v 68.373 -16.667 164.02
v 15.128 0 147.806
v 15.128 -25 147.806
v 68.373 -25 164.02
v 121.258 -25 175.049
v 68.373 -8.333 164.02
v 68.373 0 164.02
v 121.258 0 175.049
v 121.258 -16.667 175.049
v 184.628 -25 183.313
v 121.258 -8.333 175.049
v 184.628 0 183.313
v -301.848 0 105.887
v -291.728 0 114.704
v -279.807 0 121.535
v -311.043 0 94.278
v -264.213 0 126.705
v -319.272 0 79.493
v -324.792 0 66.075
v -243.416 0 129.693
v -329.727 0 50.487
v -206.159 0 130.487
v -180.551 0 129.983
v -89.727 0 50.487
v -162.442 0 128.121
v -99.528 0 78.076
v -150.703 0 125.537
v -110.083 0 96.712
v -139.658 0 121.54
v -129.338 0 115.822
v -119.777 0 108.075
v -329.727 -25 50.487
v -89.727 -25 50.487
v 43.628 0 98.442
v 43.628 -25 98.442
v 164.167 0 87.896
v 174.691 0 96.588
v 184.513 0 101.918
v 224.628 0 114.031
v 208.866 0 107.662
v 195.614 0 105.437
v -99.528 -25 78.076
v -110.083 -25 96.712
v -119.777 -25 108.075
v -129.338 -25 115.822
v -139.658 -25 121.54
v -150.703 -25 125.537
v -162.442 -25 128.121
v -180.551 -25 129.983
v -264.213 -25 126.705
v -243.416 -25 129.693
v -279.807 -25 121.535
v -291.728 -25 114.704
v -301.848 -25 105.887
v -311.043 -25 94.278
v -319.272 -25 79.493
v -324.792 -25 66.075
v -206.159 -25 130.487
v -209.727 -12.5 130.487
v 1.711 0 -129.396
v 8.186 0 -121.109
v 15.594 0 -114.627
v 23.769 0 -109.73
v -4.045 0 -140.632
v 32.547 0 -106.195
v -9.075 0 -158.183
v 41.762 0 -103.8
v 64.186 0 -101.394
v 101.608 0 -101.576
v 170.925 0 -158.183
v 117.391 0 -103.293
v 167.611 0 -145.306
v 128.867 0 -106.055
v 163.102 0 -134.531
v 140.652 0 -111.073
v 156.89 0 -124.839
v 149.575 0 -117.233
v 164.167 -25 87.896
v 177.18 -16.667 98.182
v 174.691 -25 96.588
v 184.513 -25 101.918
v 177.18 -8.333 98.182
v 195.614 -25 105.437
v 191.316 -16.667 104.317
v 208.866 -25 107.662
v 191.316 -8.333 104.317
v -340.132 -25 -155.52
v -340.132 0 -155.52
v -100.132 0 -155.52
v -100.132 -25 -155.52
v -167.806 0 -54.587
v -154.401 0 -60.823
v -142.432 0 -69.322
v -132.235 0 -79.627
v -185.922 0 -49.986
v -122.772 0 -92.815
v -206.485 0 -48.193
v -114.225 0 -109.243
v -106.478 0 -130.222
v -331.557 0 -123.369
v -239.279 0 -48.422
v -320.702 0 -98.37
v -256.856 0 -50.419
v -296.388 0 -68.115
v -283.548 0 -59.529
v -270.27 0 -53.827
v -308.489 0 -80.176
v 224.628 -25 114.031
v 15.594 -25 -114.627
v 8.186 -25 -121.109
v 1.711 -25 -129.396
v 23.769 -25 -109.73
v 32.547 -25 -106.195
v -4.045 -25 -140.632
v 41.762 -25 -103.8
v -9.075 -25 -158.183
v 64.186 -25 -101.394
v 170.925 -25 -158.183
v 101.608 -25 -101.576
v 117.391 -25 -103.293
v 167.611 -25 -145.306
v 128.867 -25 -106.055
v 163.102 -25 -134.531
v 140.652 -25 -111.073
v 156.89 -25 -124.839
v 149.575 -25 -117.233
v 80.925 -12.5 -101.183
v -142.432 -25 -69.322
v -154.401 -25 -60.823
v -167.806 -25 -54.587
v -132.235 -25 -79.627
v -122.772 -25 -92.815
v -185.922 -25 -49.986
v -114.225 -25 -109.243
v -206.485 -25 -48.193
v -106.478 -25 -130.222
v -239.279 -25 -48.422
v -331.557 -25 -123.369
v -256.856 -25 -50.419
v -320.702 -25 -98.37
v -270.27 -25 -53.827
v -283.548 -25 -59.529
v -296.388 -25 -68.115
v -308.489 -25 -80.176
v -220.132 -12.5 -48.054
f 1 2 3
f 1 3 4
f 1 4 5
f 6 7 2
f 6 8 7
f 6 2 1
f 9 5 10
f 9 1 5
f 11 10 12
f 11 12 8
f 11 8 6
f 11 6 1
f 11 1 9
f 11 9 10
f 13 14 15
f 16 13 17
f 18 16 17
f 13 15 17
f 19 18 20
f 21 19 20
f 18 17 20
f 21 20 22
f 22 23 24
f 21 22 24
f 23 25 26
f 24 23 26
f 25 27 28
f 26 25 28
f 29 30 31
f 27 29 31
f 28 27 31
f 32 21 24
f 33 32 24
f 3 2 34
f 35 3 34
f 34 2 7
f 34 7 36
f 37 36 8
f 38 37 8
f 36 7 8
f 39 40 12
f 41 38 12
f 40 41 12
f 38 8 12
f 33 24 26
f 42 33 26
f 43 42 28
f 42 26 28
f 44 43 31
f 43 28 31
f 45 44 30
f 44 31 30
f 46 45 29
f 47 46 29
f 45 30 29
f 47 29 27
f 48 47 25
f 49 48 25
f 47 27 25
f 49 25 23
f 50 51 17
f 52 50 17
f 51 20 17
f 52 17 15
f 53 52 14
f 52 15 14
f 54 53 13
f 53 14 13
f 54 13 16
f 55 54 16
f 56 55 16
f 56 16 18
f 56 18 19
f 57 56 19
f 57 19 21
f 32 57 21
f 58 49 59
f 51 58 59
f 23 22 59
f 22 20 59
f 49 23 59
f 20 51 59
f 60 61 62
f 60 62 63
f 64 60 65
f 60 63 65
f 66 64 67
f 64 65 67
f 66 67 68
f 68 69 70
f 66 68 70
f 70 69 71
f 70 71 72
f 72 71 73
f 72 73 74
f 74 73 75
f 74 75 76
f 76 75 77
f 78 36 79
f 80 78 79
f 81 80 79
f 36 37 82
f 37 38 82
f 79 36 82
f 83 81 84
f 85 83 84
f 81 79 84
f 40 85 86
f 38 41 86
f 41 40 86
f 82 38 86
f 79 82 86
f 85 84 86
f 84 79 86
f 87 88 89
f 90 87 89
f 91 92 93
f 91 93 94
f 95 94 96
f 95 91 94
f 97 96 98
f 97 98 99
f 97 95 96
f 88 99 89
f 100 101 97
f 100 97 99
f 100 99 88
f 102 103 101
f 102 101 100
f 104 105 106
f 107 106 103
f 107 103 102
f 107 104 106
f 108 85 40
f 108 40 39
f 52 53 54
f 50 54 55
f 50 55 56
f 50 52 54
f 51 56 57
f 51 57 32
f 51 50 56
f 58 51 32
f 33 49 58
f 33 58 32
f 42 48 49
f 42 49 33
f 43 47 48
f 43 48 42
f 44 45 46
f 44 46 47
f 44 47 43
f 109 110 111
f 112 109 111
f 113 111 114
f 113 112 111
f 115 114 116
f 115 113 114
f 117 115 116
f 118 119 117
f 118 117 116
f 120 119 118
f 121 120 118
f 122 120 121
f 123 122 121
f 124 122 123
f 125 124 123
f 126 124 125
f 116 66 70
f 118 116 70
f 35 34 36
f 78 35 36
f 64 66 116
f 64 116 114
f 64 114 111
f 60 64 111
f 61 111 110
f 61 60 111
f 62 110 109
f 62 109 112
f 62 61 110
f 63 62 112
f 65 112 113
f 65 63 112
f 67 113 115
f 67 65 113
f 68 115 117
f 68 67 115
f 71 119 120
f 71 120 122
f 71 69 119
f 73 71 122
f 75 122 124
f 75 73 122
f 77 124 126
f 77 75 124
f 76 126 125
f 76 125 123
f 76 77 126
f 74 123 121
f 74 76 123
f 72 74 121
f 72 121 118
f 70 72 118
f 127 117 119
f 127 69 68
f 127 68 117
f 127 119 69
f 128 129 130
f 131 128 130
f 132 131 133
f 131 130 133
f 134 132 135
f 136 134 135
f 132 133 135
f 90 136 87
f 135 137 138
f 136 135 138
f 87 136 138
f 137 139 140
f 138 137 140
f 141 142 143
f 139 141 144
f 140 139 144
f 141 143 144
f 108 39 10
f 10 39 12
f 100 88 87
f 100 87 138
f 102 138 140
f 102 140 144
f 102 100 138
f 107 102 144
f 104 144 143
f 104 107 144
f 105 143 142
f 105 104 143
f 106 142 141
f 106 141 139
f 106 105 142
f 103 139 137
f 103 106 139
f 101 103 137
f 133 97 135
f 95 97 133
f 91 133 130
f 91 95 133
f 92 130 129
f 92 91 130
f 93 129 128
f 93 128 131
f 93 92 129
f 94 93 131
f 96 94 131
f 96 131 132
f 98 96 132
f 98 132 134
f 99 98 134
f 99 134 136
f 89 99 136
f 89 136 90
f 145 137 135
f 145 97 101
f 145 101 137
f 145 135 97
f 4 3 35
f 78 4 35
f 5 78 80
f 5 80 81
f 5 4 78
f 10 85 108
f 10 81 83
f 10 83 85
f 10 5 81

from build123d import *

# Parameters (mm, degrees)
F1_DEPTH = 25


with BuildPart() as f1:
    # F0 (on Front) → F1 (new body)
    with BuildSketch(Plane.XZ):
        with BuildLine():
            add(Edge.make_bspline(
                [(-209.727108, 130.487437), (-264.727108, 130.487437), (-307.545149, 130.487437), (-329.727108, 50.487437)],
                knots=[0, 0, 0, 0, 144.222051, 144.222051, 144.222051, 144.222051], degree=3))
            Line((-329.727108, 50.487437), (-89.727108, 50.487437))
            add(Edge.make_bspline(
                [(-209.727108, 130.487437), (-154.727108, 130.487437), (-111.909068, 130.487437), (-89.727108, 50.487437)],
                knots=[0, 0, 0, 0, 144.222051, 144.222051, 144.222051, 144.222051], degree=3))
        make_face()
        with BuildLine():
            add(Edge.make_bspline(
                [(-340.13229, -155.519664), (-318.40942, -48.05428), (-260.13229, -48.05428), (-220.13229, -48.05428)],
                knots=[0, 0, 0, 0, 161.08634, 161.08634, 161.08634, 161.08634], degree=3))
            Line((-340.13229, -155.519664), (-100.13229, -155.519664))
            add(Edge.make_bspline(
                [(-220.13229, -48.05428), (-180.13229, -48.05428), (-121.855161, -48.05428), (-100.13229, -155.519664)],
                knots=[0, 0, 0, 0, 161.08634, 161.08634, 161.08634, 161.08634], degree=3))
        make_face()
        with BuildLine():
            Line((-9.075422, -158.183262), (170.924578, -158.183262))
            add(Edge.make_bspline(
                [(80.924578, -101.183262), (115.924578, -101.183262), (160.050973, -101.183262), (170.924578, -158.183262)],
                knots=[0, 0, 0, 0, 106.531685, 106.531685, 106.531685, 106.531685], degree=3))
            add(Edge.make_bspline(
                [(-9.075422, -158.183262), (1.798183, -101.183262), (45.924578, -101.183262), (80.924578, -101.183262)],
                knots=[0, 0, 0, 0, 106.531685, 106.531685, 106.531685, 106.531685], degree=3))
        make_face()
        with BuildLine():
            Line((208.865712, 107.662402), (224.627837, 114.030714))
            Line((224.627837, 114.030714), (184.627837, 183.312746))
            add(Edge.make_bspline(
                [(15.127837, 147.805705), (72.169736, 167.419079), (112.398855, 175.624958), (184.627837, 183.312746)],
                knots=[0, 0, 0, 0, 173.179098, 173.179098, 173.179098, 173.179098], degree=3))
            Line((15.127837, 147.805705), (43.627837, 98.442257))
            Line((43.627837, 98.442257), (164.167396, 87.896412))
            add(Edge.make_bspline(
                [(164.167396, 87.896412), (177.380963, 100.709568), (188.845151, 105.259935), (208.865712, 107.662402)],
                knots=[0, 0, 0, 0, 48.873652, 48.873652, 48.873652, 48.873652], degree=3))
        make_face()
    extrude(amount=F1_DEPTH)


solid = f1.part
